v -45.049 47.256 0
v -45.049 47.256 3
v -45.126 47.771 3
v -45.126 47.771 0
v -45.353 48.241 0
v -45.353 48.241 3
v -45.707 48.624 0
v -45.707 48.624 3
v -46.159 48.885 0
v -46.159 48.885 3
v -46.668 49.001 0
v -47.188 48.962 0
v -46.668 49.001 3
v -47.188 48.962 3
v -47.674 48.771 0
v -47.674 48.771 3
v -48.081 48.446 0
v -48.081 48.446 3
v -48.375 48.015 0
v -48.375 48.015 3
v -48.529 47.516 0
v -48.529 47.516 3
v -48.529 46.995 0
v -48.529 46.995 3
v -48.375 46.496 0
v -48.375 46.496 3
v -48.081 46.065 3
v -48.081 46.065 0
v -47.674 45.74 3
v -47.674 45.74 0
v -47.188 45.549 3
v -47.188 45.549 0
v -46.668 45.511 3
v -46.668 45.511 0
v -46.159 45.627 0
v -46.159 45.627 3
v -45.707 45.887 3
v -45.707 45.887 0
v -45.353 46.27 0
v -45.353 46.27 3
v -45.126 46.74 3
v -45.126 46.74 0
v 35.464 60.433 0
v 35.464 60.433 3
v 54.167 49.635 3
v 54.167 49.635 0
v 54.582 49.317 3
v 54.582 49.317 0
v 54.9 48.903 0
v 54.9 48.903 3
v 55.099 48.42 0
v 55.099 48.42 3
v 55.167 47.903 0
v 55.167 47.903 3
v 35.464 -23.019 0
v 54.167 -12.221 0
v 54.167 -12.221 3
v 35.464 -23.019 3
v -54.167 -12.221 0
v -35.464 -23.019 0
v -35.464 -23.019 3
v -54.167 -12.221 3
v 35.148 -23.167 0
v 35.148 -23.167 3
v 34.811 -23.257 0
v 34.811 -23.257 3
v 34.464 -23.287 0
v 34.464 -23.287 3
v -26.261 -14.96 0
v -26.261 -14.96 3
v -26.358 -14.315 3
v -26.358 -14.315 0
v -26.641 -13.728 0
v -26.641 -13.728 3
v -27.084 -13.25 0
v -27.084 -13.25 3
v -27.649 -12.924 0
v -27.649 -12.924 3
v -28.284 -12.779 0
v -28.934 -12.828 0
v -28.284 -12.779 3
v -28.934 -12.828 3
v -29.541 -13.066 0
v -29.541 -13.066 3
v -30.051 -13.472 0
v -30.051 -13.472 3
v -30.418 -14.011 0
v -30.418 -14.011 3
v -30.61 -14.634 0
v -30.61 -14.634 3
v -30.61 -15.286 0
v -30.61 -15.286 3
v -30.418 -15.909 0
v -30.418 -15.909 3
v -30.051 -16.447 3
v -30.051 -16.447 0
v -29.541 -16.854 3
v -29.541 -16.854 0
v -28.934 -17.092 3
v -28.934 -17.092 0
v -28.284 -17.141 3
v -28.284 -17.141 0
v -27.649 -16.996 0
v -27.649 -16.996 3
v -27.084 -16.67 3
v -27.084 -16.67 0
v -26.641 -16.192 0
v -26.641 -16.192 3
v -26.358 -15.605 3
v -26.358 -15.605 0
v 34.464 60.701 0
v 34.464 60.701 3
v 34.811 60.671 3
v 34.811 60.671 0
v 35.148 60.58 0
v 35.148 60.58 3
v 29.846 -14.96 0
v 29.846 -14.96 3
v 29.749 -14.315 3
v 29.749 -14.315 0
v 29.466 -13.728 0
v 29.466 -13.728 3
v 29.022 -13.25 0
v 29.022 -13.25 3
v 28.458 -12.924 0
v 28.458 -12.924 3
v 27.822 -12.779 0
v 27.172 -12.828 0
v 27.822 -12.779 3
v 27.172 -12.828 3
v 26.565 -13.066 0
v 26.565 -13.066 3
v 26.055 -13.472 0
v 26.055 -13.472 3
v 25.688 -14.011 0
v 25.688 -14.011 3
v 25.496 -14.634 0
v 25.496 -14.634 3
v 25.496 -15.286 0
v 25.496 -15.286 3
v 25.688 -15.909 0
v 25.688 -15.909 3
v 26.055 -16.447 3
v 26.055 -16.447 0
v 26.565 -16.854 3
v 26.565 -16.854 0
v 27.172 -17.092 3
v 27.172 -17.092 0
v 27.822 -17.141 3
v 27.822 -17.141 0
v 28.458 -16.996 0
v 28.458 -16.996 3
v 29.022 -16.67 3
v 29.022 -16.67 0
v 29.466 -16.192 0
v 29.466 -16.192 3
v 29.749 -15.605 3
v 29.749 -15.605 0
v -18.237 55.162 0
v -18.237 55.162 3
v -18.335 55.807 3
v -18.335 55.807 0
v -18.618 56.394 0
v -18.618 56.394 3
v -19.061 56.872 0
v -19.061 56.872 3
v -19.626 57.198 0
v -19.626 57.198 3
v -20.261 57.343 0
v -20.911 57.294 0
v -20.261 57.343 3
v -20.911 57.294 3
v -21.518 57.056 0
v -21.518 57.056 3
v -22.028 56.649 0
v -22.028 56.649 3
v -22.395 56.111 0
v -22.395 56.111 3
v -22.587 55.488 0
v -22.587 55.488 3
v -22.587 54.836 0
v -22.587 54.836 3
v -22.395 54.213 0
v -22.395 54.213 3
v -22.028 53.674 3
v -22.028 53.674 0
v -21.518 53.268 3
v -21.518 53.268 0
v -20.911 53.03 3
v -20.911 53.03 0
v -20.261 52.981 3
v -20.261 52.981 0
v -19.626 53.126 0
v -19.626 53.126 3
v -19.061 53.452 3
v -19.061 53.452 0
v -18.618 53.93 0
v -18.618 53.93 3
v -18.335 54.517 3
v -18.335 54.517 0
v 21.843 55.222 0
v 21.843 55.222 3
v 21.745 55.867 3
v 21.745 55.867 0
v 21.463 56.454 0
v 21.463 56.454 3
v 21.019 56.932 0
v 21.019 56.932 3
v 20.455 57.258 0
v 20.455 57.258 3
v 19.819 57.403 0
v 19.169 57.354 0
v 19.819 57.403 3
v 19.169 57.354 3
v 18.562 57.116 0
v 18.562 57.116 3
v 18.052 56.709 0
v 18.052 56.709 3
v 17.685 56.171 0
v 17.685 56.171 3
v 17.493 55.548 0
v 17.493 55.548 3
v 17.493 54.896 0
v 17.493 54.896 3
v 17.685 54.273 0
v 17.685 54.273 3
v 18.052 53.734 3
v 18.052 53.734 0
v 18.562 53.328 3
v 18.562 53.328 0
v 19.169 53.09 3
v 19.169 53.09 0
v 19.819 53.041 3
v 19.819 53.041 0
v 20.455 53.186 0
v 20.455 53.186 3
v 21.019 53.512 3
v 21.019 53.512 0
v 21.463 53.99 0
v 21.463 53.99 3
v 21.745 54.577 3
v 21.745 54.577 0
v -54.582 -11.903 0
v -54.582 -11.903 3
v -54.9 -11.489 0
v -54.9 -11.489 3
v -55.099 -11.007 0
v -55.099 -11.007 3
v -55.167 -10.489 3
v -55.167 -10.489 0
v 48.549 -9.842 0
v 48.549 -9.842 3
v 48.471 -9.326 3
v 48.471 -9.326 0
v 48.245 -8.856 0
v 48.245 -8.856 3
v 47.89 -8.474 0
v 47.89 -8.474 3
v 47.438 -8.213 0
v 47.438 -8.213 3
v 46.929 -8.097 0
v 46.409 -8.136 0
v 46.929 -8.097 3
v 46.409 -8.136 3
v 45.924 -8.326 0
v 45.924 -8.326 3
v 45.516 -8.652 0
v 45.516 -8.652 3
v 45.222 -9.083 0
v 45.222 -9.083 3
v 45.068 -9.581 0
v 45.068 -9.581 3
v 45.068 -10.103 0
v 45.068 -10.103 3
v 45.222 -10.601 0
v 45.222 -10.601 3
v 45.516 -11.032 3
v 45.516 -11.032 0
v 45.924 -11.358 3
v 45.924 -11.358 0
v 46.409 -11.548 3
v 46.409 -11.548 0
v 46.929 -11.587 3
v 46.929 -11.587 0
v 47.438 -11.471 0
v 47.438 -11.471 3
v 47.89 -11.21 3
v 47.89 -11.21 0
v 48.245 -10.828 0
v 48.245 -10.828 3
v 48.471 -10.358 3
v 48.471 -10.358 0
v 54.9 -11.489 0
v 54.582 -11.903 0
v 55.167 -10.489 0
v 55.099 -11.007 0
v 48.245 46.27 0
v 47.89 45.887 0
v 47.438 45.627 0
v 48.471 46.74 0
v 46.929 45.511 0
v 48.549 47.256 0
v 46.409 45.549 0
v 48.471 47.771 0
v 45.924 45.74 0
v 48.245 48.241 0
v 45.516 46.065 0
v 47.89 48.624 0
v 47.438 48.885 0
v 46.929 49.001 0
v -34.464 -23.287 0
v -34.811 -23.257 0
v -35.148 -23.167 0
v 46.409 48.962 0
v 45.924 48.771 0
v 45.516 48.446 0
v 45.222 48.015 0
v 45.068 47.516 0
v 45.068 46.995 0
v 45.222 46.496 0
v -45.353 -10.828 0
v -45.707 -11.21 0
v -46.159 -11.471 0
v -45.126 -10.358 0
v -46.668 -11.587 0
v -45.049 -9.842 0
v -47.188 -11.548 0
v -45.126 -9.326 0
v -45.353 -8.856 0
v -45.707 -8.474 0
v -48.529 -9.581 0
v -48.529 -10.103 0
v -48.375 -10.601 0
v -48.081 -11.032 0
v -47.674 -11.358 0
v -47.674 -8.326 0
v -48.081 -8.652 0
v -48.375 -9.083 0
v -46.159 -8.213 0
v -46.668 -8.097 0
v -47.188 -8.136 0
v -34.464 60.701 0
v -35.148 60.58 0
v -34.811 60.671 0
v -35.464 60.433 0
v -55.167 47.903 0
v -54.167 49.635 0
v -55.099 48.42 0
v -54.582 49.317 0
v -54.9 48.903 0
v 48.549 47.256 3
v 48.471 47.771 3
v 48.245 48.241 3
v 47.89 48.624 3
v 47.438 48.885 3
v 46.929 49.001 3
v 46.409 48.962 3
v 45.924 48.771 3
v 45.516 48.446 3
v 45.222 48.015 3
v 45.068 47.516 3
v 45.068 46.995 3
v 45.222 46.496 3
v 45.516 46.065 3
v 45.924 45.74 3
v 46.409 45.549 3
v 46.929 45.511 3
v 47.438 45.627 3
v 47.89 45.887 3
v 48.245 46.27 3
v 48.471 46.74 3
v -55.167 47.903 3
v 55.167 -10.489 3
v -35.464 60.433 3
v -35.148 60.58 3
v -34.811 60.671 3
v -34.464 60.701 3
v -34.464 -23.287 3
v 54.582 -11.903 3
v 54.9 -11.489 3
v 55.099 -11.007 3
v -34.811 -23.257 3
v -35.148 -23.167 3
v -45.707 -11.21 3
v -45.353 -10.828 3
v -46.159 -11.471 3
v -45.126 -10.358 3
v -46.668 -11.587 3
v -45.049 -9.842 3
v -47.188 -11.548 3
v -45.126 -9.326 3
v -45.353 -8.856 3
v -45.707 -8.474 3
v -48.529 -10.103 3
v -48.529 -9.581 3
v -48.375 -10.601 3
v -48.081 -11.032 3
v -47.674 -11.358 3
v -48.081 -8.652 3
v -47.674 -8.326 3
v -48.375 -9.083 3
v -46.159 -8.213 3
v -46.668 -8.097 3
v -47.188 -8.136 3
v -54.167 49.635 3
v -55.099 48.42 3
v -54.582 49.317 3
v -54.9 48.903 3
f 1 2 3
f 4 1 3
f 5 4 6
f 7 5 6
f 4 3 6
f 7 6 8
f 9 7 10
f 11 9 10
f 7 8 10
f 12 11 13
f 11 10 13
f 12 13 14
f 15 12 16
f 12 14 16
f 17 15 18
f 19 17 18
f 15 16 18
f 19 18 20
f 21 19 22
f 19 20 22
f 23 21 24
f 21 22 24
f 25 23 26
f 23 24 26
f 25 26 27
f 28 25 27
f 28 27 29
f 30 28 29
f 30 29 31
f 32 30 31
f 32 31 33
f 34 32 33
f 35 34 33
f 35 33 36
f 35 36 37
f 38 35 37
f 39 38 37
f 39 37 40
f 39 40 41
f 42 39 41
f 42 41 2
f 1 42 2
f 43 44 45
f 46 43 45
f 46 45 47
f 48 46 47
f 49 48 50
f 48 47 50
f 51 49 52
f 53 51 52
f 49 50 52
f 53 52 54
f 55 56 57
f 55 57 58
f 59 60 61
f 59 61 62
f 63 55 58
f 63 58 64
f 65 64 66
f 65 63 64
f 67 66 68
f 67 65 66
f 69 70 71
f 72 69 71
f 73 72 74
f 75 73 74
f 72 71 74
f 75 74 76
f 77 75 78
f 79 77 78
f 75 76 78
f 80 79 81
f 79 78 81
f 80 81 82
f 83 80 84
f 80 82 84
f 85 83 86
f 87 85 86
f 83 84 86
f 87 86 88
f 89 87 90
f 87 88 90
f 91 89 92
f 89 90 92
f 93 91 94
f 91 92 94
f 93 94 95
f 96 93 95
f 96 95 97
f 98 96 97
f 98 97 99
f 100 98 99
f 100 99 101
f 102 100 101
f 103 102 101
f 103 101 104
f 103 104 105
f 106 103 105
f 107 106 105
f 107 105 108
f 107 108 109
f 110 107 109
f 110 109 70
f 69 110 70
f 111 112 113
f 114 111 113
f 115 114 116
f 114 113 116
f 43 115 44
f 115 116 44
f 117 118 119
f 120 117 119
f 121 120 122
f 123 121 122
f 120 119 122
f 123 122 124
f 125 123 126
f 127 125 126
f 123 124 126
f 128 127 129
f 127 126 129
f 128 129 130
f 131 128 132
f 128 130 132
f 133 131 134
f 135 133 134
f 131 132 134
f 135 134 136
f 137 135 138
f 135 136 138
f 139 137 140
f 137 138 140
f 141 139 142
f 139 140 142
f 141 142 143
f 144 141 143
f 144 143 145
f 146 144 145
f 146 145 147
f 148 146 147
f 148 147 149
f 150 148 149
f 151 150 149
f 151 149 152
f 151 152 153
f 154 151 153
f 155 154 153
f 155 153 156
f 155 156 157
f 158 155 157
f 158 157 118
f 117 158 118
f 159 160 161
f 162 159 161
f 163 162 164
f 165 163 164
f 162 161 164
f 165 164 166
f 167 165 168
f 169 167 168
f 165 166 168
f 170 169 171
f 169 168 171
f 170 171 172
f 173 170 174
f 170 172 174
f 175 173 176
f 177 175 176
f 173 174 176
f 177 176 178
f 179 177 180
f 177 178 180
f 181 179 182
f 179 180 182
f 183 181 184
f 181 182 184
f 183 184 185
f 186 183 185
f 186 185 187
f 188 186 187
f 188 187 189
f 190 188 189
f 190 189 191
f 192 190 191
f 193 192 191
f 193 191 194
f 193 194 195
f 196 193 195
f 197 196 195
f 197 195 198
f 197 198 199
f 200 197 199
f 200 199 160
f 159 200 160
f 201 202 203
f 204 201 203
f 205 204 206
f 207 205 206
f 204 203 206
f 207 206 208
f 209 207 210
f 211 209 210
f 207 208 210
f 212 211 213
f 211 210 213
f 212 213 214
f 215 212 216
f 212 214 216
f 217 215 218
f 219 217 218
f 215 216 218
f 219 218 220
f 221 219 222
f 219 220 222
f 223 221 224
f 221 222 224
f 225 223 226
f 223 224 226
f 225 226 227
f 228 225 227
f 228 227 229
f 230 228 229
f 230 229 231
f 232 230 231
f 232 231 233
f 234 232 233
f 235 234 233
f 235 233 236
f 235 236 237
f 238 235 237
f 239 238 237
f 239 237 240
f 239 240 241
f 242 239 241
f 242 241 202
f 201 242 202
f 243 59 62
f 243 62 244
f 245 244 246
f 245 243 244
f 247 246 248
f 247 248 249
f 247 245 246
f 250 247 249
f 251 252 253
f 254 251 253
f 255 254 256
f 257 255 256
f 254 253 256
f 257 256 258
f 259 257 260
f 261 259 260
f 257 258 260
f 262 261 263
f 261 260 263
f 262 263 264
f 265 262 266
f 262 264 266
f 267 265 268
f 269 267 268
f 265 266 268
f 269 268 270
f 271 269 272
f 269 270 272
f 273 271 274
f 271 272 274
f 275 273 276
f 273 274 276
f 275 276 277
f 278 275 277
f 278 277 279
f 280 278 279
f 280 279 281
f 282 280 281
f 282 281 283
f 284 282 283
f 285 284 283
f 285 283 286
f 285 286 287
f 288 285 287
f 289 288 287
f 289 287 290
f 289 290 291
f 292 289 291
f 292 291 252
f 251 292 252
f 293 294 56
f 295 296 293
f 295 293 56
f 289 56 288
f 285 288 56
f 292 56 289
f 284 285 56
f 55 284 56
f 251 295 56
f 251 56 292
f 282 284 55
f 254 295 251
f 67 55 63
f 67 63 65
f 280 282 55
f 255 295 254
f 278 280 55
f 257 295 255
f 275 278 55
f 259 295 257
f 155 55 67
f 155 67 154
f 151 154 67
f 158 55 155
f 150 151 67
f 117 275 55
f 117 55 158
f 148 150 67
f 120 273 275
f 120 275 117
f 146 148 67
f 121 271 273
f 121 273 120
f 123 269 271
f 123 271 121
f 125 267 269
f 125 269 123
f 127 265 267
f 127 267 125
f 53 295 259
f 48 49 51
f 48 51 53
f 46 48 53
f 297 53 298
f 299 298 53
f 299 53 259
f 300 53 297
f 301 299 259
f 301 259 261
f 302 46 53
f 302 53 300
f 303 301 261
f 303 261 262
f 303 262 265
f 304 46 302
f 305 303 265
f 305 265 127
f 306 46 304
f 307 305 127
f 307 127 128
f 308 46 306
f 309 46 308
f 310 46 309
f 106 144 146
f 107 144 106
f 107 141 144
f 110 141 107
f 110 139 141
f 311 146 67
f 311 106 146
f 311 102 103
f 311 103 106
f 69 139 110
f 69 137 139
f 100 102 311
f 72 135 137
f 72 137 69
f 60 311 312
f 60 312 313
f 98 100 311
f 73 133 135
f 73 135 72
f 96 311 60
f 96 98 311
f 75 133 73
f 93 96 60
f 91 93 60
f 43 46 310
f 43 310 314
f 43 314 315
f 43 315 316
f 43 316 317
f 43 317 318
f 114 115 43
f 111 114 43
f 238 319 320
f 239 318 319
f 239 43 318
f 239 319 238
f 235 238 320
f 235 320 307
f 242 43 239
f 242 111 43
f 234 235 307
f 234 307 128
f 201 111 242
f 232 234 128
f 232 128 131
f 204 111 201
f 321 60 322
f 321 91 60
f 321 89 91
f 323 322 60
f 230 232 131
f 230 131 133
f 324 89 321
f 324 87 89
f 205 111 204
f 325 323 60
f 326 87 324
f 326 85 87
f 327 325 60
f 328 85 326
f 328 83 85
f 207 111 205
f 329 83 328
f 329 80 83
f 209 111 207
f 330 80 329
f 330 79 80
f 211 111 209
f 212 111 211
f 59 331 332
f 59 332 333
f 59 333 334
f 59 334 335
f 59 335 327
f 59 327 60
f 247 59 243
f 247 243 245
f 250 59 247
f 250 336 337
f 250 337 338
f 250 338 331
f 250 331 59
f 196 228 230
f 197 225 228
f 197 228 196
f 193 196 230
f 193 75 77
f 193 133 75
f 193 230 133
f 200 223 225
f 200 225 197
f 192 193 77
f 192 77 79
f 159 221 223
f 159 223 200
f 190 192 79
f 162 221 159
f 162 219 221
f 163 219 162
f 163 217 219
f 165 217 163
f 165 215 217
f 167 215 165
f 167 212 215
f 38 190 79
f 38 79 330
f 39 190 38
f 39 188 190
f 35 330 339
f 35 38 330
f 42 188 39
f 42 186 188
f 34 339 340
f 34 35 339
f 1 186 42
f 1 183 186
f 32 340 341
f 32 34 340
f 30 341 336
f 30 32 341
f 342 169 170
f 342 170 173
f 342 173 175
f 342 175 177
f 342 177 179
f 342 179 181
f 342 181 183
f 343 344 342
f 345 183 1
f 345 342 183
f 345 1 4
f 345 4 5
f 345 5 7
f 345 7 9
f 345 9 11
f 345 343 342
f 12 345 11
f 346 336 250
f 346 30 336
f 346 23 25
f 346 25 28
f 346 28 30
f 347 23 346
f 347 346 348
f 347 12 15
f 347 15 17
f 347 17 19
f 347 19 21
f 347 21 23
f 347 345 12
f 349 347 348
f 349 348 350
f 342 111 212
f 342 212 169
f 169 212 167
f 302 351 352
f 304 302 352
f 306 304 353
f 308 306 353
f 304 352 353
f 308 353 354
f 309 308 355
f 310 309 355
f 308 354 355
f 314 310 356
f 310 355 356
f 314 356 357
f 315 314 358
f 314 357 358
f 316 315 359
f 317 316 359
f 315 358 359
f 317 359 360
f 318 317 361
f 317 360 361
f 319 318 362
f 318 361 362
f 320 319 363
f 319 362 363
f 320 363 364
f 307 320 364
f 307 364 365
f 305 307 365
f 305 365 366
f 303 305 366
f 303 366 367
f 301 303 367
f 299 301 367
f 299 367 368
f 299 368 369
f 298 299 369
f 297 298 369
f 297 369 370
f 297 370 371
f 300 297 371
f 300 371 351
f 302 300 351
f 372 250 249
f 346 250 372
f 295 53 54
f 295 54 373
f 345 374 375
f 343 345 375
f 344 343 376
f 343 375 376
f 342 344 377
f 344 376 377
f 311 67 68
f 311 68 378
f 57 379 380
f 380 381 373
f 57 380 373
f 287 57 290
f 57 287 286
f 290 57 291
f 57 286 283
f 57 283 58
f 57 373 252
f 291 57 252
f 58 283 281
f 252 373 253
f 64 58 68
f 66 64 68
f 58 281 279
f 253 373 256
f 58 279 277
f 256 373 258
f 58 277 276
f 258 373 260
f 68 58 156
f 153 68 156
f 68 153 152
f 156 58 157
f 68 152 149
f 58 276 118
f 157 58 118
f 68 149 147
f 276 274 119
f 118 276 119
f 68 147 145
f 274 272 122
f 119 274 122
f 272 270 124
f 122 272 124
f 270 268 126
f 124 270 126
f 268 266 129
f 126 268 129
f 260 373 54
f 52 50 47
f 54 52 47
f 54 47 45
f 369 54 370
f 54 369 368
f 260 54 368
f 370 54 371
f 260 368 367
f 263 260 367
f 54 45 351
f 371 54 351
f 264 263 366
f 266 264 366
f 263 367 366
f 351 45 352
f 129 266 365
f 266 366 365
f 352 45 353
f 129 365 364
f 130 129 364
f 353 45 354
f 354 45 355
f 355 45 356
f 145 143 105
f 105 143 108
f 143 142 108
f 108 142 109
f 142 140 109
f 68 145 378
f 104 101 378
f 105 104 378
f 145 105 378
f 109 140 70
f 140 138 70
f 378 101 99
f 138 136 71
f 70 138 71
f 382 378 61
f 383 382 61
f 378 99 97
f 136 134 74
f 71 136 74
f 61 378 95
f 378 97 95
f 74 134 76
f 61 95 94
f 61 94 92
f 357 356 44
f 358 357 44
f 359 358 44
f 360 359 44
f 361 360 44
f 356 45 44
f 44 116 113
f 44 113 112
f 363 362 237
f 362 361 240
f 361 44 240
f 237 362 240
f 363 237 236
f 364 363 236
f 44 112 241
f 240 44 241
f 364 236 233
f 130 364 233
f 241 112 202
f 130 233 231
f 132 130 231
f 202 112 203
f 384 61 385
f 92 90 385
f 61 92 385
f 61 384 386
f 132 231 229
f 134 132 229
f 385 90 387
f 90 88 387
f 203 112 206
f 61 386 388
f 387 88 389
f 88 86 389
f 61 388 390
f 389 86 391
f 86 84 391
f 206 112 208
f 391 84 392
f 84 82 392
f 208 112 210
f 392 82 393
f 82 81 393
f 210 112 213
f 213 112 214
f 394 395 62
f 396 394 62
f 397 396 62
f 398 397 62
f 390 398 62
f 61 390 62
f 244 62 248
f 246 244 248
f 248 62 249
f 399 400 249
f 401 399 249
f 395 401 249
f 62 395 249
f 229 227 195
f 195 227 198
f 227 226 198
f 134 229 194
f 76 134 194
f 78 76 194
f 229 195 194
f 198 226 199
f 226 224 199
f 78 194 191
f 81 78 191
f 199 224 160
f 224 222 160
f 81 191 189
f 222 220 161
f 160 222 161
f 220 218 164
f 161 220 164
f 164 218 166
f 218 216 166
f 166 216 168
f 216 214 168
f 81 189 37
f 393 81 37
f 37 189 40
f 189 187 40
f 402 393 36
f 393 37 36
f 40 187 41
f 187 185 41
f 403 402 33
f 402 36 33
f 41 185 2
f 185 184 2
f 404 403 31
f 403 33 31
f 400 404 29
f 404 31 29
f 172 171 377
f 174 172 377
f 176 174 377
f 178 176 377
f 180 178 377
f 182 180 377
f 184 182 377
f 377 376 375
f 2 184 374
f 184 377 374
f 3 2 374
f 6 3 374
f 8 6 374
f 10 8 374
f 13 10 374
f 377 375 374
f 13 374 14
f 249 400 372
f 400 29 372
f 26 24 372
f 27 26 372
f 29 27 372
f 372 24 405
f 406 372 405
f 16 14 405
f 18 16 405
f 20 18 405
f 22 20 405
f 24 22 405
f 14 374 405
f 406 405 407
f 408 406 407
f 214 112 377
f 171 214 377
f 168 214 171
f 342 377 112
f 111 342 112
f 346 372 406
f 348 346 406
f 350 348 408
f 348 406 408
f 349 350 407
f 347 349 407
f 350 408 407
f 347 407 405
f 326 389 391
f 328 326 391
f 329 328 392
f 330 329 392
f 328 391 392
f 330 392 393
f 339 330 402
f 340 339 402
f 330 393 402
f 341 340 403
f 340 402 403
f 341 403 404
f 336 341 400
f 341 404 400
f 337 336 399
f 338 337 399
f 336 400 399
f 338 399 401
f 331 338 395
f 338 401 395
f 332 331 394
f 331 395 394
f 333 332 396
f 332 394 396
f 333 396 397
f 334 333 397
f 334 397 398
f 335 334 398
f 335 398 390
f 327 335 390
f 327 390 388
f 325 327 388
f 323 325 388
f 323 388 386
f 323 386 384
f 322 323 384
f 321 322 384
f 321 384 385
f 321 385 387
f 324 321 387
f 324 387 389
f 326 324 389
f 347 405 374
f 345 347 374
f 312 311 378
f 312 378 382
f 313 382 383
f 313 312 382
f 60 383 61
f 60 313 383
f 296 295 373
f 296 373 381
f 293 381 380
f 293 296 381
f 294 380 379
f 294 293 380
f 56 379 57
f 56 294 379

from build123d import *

# Parameters (mm, degrees)
EXTRUDE_1_DEPTH     = 3
EXTRUDE_START       = -3
EXTRUDE_2_DEPTH     = 3
EXTRUDE_3_DEPTH     = 3
SKETCH_4_R          = 2.187098749
CUT_EXTRUDE_1_DEPTH = 10
SKETCH_5_R          = 1.75
CUT_EXTRUDE_2_DEPTH = 10


with BuildPart() as part:
    # 草图1 → 凸台-拉伸1 (new body)
    with BuildSketch(Plane.XY):
        with BuildLine():
            Line((-34.464101615, 23.287401575), (34.464101615, 23.287401575))
            ThreePointArc((34.464101615, 23.287401575), (34.981739705, 23.219253227), (35.464101615, 23.019452382))
            Line((35.464101615, 23.019452382), (54.167481352, 12.221051057))
            ThreePointArc((54.167481352, 12.221051057), (54.899532159, 11.489000249), (55.167481352, 10.489000249))
            Line((55.167481352, 10.489000249), (55.167481352, -10.489000249))
            ThreePointArc((55.167481352, -10.489000249), (54.899532159, -11.489000249), (54.167481352, -12.221051057))
            Line((54.167481352, -12.221051057), (35.464101615, -23.019452382))
            ThreePointArc((35.464101615, -23.019452382), (34.981739705, -23.219253227), (34.464101615, -23.287401575))
            Line((34.464101615, -23.287401575), (-34.464101615, -23.287401575))
            ThreePointArc((-34.464101615, -23.287401575), (-34.981739705, -23.219253227), (-35.464101615, -23.019452382))
            Line((-35.464101615, -23.019452382), (-54.167481352, -12.221051057))
            ThreePointArc((-54.167481352, -12.221051057), (-54.899532159, -11.489000249), (-55.167481352, -10.489000249))
            Line((-55.167481352, -10.489000249), (-55.167481352, 10.489000249))
            ThreePointArc((-55.167481352, 10.489000249), (-54.899532159, 11.489000249), (-54.167481352, 12.221051057))
            Line((-54.167481352, 12.221051057), (-35.464101615, 23.019452382))
            ThreePointArc((-35.464101615, 23.019452382), (-34.981739705, 23.219253227), (-34.464101615, 23.287401575))
        make_face()
    extrude(amount=EXTRUDE_1_DEPTH)

    # 草图2 → 凸台-拉伸2 (add)
    with BuildSketch(Plane.XY.offset(3).offset(EXTRUDE_START)):
        with BuildLine():
            Line((-55.167481352, 15.551379934), (-55.167481352, 10.489000249))
            Line((-55.167481352, 10.489000249), (-55.167481352, -10.489000249))
            ThreePointArc((-55.167481352, -10.489000249), (-54.899532159, -11.489000249), (-54.167481352, -12.221051057))
            Line((-54.167481352, -12.221051057), (-35.464101615, -23.019452382))
            ThreePointArc((-35.464101615, -23.019452382), (-34.981739705, -23.219253227), (-34.464101615, -23.287401575))
            Line((-34.464101615, -23.287401575), (34.464101615, -23.287401575))
            ThreePointArc((34.464101615, -23.287401575), (34.981739705, -23.219253227), (35.464101615, -23.019452382))
            Line((35.464101615, -23.019452382), (54.167481352, -12.221051057))
            ThreePointArc((54.167481352, -12.221051057), (54.899532159, -11.489000249), (55.167481352, -10.489000249))
            Line((55.167481352, -10.489000249), (55.167481352, 10.489000249))
            Line((55.167481352, 10.489000249), (55.167481352, 15.551379934))
            Line((55.167481352, 15.551379934), (55.167481352, 36.529380432))
            ThreePointArc((55.167481352, 36.529380432), (54.899532159, 37.529380432), (54.167481352, 38.26143124))
            Line((54.167481352, 38.26143124), (35.464101615, 49.059832565))
            ThreePointArc((35.464101615, 49.059832565), (34.981739705, 49.25963341), (34.464101615, 49.327781758))
            Line((34.464101615, 49.327781758), (-34.464101615, 49.327781758))
            ThreePointArc((-34.464101615, 49.327781758), (-34.981739705, 49.25963341), (-35.464101615, 49.059832565))
            Line((-35.464101615, 49.059832565), (-54.167481352, 38.26143124))
            ThreePointArc((-54.167481352, 38.26143124), (-54.899532159, 37.529380432), (-55.167481352, 36.529380432))
            Line((-55.167481352, 36.529380432), (-55.167481352, 15.551379934))
        make_face()
    extrude(amount=EXTRUDE_2_DEPTH)

    # 草图3 → 凸台-拉伸3 (add)
    with BuildSketch(Plane.XY.offset(3)):
        with BuildLine():
            Line((55.167481352, 33.186292179), (-55.167481352, 33.186292179))
            Line((-55.167481352, 33.186292179), (-55.167481352, 47.90257896))
            ThreePointArc((-55.167481352, 47.90257896), (-54.899532159, 48.90257896), (-54.167481352, 49.634629768))
            Line((-54.167481352, 49.634629768), (-35.464101615, 60.433031094))
            ThreePointArc((-35.464101615, 60.433031094), (-34.981739705, 60.632831939), (-34.464101615, 60.700980286))
            Line((-34.464101615, 60.700980286), (34.464101615, 60.700980286))
            ThreePointArc((34.464101615, 60.700980286), (34.981739705, 60.632831939), (35.464101615, 60.433031094))
            Line((35.464101615, 60.433031094), (54.167481352, 49.634629768))
            ThreePointArc((54.167481352, 49.634629768), (54.899532159, 48.90257896), (55.167481352, 47.90257896))
            Line((55.167481352, 47.90257896), (55.167481352, 33.186292179))
        make_face()
    extrude(amount=-EXTRUDE_3_DEPTH)

    # 草图4 → 切除-拉伸1 (cut)
    with BuildSketch(Plane.XY.offset(3)):
        with Locations((-20.424577197, 55.161880556)):
            Circle(SKETCH_4_R)
        with Locations((19.655486733, 55.22184421)):
            Circle(SKETCH_4_R)
        with Locations((27.658697285, -14.95988945)):
            Circle(SKETCH_4_R)
        with Locations((-28.447724115, -14.95988945)):
            Circle(SKETCH_4_R)
    extrude(amount=-CUT_EXTRUDE_1_DEPTH, mode=Mode.SUBTRACT)

    # 草图5 → 切除-拉伸2 (cut)
    with BuildSketch(Plane.XY.offset(3)):
        with Locations((46.798601885, 47.255616016)):
            Circle(SKETCH_5_R)
        with Locations((-46.798601885, 47.255616016)):
            Circle(SKETCH_5_R)
        with Locations((46.798601885, -9.842037304)):
            Circle(SKETCH_5_R)
        with Locations((-46.798601885, -9.842037304)):
            Circle(SKETCH_5_R)
    extrude(amount=-CUT_EXTRUDE_2_DEPTH, mode=Mode.SUBTRACT)


solid = part.part
